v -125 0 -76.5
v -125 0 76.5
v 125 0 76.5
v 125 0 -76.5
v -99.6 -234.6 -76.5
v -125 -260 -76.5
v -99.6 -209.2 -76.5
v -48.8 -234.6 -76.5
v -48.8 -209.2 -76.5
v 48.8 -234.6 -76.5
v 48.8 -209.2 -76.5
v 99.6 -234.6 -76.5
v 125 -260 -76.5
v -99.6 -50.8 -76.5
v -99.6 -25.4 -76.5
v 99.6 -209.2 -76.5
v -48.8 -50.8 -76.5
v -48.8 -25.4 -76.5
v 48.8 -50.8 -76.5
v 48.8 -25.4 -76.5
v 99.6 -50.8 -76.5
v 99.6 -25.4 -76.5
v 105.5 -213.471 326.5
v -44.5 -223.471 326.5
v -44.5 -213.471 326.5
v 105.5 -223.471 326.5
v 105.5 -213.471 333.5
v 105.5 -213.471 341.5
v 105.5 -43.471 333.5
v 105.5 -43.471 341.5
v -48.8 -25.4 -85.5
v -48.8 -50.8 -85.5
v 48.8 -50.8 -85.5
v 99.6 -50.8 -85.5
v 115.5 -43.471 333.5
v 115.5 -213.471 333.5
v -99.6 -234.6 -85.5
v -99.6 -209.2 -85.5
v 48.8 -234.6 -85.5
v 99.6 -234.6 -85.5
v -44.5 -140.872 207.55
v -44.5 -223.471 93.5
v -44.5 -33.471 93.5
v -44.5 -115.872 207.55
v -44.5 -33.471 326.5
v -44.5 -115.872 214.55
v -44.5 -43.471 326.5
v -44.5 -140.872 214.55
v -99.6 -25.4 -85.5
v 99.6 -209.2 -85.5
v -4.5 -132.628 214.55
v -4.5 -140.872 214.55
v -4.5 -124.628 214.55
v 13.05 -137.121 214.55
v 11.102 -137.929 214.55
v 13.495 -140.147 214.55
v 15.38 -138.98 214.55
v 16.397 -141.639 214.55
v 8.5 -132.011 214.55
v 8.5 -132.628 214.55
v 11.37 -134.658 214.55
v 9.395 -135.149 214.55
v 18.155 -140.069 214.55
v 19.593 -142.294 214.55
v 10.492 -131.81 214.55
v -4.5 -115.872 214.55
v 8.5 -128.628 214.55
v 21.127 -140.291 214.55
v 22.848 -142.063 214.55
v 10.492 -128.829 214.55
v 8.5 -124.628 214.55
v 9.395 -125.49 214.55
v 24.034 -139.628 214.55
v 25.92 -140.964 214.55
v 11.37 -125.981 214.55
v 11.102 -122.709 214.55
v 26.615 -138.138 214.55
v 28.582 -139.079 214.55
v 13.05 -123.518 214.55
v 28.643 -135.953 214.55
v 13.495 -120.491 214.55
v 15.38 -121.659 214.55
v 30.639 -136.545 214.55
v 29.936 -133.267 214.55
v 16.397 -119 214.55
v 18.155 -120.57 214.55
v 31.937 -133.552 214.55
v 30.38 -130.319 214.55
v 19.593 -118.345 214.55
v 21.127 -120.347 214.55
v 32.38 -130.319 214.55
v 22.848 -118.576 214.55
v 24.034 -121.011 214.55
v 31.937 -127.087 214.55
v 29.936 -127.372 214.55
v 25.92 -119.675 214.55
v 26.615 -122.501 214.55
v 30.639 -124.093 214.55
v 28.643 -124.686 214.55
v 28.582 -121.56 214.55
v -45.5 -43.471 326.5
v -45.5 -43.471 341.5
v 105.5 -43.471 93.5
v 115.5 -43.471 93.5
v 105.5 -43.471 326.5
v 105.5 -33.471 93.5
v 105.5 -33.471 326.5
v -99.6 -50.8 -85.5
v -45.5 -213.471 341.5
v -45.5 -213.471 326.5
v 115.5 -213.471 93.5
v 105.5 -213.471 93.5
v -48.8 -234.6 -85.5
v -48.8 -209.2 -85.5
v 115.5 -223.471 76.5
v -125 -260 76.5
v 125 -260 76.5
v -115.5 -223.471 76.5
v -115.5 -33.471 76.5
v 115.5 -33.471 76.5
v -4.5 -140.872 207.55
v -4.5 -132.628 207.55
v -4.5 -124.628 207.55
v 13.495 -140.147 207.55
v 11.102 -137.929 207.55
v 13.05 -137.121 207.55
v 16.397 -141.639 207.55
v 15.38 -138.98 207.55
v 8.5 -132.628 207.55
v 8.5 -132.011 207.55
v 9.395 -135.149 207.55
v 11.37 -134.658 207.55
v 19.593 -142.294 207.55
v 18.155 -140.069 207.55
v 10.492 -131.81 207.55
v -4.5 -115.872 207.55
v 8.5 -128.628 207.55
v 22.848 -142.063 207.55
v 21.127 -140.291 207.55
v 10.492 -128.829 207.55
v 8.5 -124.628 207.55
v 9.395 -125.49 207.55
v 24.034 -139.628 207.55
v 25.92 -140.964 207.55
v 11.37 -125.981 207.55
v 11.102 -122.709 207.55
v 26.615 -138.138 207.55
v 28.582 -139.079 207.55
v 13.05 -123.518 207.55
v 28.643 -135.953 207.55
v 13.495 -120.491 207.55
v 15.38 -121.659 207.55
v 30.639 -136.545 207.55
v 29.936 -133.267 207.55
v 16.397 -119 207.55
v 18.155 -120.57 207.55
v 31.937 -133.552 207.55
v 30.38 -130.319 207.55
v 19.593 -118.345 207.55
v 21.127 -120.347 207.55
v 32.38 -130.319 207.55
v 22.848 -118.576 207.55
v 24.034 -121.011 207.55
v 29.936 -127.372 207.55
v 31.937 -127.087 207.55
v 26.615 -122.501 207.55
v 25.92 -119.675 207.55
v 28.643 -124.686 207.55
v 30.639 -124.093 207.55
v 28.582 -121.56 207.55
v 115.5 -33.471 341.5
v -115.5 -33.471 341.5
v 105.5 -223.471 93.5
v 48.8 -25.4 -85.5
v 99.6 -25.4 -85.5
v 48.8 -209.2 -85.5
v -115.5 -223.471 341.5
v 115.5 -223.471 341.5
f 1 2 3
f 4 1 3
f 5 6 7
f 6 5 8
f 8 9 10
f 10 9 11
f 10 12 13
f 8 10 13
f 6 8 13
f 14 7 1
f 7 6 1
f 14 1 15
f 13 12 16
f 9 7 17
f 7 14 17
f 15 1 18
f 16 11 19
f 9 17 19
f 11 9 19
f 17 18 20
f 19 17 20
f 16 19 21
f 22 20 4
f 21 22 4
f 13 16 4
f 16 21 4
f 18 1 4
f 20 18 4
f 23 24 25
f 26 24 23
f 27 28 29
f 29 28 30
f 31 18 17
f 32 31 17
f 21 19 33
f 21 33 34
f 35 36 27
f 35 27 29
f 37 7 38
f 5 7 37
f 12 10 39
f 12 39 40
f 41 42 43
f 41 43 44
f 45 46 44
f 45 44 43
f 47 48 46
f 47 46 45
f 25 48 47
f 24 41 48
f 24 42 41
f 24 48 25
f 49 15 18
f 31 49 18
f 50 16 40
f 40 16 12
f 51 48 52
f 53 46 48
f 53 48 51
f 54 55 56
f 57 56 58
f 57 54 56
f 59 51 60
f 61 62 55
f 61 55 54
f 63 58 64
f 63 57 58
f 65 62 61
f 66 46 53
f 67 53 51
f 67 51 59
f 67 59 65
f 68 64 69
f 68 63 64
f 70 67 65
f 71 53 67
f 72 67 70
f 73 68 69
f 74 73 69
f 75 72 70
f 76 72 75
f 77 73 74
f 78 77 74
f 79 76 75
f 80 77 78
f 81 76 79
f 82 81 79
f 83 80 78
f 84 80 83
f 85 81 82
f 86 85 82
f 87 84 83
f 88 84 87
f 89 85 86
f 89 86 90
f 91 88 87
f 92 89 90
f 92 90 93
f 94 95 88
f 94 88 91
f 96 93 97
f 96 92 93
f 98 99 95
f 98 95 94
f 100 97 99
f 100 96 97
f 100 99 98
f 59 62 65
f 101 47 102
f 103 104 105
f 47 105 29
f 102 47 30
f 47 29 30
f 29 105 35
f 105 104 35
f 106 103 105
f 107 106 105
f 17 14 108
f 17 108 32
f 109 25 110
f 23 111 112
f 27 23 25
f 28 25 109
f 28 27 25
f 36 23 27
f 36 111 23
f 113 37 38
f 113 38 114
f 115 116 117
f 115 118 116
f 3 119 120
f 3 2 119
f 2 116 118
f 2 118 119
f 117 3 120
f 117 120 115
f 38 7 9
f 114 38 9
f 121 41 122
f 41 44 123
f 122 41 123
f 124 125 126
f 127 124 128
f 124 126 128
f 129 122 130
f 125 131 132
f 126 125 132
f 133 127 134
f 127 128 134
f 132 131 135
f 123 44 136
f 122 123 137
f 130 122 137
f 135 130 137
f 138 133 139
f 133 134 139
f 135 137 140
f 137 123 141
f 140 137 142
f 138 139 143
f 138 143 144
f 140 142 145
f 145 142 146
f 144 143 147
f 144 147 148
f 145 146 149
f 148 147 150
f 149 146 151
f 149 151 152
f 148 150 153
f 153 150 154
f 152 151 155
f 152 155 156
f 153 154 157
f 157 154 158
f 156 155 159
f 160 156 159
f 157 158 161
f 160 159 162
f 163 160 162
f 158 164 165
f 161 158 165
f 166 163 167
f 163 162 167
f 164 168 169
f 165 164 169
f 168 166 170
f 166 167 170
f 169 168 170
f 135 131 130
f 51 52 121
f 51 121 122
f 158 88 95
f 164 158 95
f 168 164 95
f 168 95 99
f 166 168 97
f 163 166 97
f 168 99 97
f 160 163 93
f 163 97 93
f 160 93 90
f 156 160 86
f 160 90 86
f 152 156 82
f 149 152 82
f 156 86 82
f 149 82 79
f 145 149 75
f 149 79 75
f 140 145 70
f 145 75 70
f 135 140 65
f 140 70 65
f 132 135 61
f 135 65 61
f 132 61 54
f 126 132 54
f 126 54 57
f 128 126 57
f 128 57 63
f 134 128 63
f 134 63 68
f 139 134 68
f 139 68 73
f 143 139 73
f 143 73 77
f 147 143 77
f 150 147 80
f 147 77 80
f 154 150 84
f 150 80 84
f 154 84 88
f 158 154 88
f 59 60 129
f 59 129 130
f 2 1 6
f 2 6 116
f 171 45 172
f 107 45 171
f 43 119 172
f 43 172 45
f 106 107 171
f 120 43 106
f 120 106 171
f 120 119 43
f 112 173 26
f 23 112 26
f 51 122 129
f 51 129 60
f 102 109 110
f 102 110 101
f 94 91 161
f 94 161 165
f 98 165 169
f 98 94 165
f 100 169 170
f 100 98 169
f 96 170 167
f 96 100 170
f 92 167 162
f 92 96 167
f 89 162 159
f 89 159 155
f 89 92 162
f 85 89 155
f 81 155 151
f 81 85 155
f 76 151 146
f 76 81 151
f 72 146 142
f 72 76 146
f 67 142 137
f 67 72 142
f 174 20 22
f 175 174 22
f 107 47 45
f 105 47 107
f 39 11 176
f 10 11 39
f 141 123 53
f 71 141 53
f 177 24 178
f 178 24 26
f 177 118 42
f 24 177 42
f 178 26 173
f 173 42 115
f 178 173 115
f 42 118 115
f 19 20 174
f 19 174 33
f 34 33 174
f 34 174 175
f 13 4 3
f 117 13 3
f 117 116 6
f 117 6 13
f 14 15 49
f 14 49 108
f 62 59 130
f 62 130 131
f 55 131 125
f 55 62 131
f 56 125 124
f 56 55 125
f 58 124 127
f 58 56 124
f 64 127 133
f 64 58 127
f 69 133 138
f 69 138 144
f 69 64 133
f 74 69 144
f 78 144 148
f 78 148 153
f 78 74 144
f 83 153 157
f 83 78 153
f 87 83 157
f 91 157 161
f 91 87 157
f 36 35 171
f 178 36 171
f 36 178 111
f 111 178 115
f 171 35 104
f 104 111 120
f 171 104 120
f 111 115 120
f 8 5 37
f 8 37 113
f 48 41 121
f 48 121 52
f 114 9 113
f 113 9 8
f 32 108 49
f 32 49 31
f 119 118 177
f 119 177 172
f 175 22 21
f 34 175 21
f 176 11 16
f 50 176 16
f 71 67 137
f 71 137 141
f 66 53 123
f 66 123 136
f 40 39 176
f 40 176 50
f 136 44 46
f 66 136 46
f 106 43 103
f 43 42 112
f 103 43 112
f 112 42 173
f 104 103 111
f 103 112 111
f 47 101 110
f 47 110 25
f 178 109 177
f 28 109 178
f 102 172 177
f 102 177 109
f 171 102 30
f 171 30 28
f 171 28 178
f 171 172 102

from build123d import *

# Parameters (mm, degrees)
F0_W      = 250
F0_H      = 153
F1_DEPTH  = 260
F2_W      = 231
F2_H      = 190
F3_DEPTH  = 265
F4_W      = 150
F4_H      = 233
F5_DEPTH  = 190
F6_W      = 170
F6_H      = 240
F7_DEPTH  = 10
F8_W      = 151
F8_H      = 170
F9_DEPTH  = 15
F10_W     = 25
F10_H     = 7
F11_DEPTH = 40
F12_W     = 8
F12_H     = 7
F13_DEPTH = 13
F14_R     = 12
F15_DEPTH = 7
F16_R     = 10
F17_DEPTH = 7
F18_W     = 50.8
F18_H     = 25.4
F19_DEPTH = 9
F20_W     = 50.8
F20_H     = 25.4
F21_DEPTH = 9
F22_W     = 50.8
F22_H     = 25.4
F23_DEPTH = 9
F24_W     = 50.8
F24_H     = 25.4
F25_DEPTH = 9


with BuildPart() as f1:
    # F0 (on Front) → F1 (new body)
    with BuildSketch(Plane.XZ):
        Rectangle(F0_W, F0_H)
    extrude(amount=F1_DEPTH)

    # F2 (on face) → F3 (join)
    with BuildSketch(Plane.XY.offset(76.5)):
        with Locations((0, -128.47054)):
            Rectangle(F2_W, F2_H)
    extrude(amount=F3_DEPTH)

    # F4 (on face) → F5 (cut)
    with BuildSketch(Plane.XZ.offset(223.47054)):
        with Locations((30.5, 210)):
            Rectangle(F4_W, F4_H)
    extrude(amount=-F5_DEPTH, mode=Mode.SUBTRACT)

    # F6 (on face) → F7 (cut)
    with BuildSketch(Plane.YZ.offset(115.5)):
        with Locations((-128.47054, 213.5)):
            Rectangle(F6_W, F6_H)
    extrude(amount=-F7_DEPTH, mode=Mode.SUBTRACT)

    # F8 (on face) → F9 (cut)
    with BuildSketch(Plane.XY.offset(341.5)):
        with Locations((30, -128.47054)):
            Rectangle(F8_W, F8_H)
    extrude(amount=-F9_DEPTH, mode=Mode.SUBTRACT)

    # F10 (on face) → F11 (join)
    with BuildSketch(Plane.YZ.offset(-44.5)):
        with Locations((-128.371669, 211.050056)):
            Rectangle(F10_W, F10_H)
    extrude(amount=F11_DEPTH)

    # F12 (on face) → F13 (join)
    with BuildSketch(Plane.YZ.offset(-4.5)):
        with Locations((-128.627784, 211.050056)):
            Rectangle(F12_W, F12_H)
    extrude(amount=F13_DEPTH)

    # F14 (on face) → F15 (join)
    with BuildSketch(Plane.XY.offset(214.550056)):
        with Locations((20.38017, -130.319401)):
            Circle(F14_R)
    extrude(amount=-F15_DEPTH)

    # F16 (on face) → F17 (cut)
    with BuildSketch(Plane.XY.offset(214.550056)):
        with Locations((20.38017, -130.319401)):
            Circle(F16_R)
    extrude(amount=-F17_DEPTH, mode=Mode.SUBTRACT)

    # F18 (on face) → F19 (join)
    with BuildSketch(Plane(origin=(0, 0, -76.5), x_dir=(1, 0, 0), z_dir=(0, 0, -1))):
        with Locations((-74.2, 221.9)):
            Rectangle(F18_W, F18_H)
    extrude(amount=F19_DEPTH)

    # F20 (on face) → F21 (join)
    with BuildSketch(Plane(origin=(0, 0, -76.5), x_dir=(1, 0, 0), z_dir=(0, 0, -1))):
        with Locations((74.2, 221.9)):
            Rectangle(F20_W, F20_H)
    extrude(amount=F21_DEPTH)

    # F22 (on face) → F23 (join)
    with BuildSketch(Plane(origin=(0, 0, -76.5), x_dir=(1, 0, 0), z_dir=(0, 0, -1))):
        with Locations((74.2, 38.1)):
            Rectangle(F22_W, F22_H)
    extrude(amount=F23_DEPTH)

    # F24 (on face) → F25 (join)
    with BuildSketch(Plane(origin=(0, 0, -76.5), x_dir=(1, 0, 0), z_dir=(0, 0, -1))):
        with Locations((-74.2, 38.1)):
            Rectangle(F24_W, F24_H)
    extrude(amount=F25_DEPTH)


solid = f1.part
